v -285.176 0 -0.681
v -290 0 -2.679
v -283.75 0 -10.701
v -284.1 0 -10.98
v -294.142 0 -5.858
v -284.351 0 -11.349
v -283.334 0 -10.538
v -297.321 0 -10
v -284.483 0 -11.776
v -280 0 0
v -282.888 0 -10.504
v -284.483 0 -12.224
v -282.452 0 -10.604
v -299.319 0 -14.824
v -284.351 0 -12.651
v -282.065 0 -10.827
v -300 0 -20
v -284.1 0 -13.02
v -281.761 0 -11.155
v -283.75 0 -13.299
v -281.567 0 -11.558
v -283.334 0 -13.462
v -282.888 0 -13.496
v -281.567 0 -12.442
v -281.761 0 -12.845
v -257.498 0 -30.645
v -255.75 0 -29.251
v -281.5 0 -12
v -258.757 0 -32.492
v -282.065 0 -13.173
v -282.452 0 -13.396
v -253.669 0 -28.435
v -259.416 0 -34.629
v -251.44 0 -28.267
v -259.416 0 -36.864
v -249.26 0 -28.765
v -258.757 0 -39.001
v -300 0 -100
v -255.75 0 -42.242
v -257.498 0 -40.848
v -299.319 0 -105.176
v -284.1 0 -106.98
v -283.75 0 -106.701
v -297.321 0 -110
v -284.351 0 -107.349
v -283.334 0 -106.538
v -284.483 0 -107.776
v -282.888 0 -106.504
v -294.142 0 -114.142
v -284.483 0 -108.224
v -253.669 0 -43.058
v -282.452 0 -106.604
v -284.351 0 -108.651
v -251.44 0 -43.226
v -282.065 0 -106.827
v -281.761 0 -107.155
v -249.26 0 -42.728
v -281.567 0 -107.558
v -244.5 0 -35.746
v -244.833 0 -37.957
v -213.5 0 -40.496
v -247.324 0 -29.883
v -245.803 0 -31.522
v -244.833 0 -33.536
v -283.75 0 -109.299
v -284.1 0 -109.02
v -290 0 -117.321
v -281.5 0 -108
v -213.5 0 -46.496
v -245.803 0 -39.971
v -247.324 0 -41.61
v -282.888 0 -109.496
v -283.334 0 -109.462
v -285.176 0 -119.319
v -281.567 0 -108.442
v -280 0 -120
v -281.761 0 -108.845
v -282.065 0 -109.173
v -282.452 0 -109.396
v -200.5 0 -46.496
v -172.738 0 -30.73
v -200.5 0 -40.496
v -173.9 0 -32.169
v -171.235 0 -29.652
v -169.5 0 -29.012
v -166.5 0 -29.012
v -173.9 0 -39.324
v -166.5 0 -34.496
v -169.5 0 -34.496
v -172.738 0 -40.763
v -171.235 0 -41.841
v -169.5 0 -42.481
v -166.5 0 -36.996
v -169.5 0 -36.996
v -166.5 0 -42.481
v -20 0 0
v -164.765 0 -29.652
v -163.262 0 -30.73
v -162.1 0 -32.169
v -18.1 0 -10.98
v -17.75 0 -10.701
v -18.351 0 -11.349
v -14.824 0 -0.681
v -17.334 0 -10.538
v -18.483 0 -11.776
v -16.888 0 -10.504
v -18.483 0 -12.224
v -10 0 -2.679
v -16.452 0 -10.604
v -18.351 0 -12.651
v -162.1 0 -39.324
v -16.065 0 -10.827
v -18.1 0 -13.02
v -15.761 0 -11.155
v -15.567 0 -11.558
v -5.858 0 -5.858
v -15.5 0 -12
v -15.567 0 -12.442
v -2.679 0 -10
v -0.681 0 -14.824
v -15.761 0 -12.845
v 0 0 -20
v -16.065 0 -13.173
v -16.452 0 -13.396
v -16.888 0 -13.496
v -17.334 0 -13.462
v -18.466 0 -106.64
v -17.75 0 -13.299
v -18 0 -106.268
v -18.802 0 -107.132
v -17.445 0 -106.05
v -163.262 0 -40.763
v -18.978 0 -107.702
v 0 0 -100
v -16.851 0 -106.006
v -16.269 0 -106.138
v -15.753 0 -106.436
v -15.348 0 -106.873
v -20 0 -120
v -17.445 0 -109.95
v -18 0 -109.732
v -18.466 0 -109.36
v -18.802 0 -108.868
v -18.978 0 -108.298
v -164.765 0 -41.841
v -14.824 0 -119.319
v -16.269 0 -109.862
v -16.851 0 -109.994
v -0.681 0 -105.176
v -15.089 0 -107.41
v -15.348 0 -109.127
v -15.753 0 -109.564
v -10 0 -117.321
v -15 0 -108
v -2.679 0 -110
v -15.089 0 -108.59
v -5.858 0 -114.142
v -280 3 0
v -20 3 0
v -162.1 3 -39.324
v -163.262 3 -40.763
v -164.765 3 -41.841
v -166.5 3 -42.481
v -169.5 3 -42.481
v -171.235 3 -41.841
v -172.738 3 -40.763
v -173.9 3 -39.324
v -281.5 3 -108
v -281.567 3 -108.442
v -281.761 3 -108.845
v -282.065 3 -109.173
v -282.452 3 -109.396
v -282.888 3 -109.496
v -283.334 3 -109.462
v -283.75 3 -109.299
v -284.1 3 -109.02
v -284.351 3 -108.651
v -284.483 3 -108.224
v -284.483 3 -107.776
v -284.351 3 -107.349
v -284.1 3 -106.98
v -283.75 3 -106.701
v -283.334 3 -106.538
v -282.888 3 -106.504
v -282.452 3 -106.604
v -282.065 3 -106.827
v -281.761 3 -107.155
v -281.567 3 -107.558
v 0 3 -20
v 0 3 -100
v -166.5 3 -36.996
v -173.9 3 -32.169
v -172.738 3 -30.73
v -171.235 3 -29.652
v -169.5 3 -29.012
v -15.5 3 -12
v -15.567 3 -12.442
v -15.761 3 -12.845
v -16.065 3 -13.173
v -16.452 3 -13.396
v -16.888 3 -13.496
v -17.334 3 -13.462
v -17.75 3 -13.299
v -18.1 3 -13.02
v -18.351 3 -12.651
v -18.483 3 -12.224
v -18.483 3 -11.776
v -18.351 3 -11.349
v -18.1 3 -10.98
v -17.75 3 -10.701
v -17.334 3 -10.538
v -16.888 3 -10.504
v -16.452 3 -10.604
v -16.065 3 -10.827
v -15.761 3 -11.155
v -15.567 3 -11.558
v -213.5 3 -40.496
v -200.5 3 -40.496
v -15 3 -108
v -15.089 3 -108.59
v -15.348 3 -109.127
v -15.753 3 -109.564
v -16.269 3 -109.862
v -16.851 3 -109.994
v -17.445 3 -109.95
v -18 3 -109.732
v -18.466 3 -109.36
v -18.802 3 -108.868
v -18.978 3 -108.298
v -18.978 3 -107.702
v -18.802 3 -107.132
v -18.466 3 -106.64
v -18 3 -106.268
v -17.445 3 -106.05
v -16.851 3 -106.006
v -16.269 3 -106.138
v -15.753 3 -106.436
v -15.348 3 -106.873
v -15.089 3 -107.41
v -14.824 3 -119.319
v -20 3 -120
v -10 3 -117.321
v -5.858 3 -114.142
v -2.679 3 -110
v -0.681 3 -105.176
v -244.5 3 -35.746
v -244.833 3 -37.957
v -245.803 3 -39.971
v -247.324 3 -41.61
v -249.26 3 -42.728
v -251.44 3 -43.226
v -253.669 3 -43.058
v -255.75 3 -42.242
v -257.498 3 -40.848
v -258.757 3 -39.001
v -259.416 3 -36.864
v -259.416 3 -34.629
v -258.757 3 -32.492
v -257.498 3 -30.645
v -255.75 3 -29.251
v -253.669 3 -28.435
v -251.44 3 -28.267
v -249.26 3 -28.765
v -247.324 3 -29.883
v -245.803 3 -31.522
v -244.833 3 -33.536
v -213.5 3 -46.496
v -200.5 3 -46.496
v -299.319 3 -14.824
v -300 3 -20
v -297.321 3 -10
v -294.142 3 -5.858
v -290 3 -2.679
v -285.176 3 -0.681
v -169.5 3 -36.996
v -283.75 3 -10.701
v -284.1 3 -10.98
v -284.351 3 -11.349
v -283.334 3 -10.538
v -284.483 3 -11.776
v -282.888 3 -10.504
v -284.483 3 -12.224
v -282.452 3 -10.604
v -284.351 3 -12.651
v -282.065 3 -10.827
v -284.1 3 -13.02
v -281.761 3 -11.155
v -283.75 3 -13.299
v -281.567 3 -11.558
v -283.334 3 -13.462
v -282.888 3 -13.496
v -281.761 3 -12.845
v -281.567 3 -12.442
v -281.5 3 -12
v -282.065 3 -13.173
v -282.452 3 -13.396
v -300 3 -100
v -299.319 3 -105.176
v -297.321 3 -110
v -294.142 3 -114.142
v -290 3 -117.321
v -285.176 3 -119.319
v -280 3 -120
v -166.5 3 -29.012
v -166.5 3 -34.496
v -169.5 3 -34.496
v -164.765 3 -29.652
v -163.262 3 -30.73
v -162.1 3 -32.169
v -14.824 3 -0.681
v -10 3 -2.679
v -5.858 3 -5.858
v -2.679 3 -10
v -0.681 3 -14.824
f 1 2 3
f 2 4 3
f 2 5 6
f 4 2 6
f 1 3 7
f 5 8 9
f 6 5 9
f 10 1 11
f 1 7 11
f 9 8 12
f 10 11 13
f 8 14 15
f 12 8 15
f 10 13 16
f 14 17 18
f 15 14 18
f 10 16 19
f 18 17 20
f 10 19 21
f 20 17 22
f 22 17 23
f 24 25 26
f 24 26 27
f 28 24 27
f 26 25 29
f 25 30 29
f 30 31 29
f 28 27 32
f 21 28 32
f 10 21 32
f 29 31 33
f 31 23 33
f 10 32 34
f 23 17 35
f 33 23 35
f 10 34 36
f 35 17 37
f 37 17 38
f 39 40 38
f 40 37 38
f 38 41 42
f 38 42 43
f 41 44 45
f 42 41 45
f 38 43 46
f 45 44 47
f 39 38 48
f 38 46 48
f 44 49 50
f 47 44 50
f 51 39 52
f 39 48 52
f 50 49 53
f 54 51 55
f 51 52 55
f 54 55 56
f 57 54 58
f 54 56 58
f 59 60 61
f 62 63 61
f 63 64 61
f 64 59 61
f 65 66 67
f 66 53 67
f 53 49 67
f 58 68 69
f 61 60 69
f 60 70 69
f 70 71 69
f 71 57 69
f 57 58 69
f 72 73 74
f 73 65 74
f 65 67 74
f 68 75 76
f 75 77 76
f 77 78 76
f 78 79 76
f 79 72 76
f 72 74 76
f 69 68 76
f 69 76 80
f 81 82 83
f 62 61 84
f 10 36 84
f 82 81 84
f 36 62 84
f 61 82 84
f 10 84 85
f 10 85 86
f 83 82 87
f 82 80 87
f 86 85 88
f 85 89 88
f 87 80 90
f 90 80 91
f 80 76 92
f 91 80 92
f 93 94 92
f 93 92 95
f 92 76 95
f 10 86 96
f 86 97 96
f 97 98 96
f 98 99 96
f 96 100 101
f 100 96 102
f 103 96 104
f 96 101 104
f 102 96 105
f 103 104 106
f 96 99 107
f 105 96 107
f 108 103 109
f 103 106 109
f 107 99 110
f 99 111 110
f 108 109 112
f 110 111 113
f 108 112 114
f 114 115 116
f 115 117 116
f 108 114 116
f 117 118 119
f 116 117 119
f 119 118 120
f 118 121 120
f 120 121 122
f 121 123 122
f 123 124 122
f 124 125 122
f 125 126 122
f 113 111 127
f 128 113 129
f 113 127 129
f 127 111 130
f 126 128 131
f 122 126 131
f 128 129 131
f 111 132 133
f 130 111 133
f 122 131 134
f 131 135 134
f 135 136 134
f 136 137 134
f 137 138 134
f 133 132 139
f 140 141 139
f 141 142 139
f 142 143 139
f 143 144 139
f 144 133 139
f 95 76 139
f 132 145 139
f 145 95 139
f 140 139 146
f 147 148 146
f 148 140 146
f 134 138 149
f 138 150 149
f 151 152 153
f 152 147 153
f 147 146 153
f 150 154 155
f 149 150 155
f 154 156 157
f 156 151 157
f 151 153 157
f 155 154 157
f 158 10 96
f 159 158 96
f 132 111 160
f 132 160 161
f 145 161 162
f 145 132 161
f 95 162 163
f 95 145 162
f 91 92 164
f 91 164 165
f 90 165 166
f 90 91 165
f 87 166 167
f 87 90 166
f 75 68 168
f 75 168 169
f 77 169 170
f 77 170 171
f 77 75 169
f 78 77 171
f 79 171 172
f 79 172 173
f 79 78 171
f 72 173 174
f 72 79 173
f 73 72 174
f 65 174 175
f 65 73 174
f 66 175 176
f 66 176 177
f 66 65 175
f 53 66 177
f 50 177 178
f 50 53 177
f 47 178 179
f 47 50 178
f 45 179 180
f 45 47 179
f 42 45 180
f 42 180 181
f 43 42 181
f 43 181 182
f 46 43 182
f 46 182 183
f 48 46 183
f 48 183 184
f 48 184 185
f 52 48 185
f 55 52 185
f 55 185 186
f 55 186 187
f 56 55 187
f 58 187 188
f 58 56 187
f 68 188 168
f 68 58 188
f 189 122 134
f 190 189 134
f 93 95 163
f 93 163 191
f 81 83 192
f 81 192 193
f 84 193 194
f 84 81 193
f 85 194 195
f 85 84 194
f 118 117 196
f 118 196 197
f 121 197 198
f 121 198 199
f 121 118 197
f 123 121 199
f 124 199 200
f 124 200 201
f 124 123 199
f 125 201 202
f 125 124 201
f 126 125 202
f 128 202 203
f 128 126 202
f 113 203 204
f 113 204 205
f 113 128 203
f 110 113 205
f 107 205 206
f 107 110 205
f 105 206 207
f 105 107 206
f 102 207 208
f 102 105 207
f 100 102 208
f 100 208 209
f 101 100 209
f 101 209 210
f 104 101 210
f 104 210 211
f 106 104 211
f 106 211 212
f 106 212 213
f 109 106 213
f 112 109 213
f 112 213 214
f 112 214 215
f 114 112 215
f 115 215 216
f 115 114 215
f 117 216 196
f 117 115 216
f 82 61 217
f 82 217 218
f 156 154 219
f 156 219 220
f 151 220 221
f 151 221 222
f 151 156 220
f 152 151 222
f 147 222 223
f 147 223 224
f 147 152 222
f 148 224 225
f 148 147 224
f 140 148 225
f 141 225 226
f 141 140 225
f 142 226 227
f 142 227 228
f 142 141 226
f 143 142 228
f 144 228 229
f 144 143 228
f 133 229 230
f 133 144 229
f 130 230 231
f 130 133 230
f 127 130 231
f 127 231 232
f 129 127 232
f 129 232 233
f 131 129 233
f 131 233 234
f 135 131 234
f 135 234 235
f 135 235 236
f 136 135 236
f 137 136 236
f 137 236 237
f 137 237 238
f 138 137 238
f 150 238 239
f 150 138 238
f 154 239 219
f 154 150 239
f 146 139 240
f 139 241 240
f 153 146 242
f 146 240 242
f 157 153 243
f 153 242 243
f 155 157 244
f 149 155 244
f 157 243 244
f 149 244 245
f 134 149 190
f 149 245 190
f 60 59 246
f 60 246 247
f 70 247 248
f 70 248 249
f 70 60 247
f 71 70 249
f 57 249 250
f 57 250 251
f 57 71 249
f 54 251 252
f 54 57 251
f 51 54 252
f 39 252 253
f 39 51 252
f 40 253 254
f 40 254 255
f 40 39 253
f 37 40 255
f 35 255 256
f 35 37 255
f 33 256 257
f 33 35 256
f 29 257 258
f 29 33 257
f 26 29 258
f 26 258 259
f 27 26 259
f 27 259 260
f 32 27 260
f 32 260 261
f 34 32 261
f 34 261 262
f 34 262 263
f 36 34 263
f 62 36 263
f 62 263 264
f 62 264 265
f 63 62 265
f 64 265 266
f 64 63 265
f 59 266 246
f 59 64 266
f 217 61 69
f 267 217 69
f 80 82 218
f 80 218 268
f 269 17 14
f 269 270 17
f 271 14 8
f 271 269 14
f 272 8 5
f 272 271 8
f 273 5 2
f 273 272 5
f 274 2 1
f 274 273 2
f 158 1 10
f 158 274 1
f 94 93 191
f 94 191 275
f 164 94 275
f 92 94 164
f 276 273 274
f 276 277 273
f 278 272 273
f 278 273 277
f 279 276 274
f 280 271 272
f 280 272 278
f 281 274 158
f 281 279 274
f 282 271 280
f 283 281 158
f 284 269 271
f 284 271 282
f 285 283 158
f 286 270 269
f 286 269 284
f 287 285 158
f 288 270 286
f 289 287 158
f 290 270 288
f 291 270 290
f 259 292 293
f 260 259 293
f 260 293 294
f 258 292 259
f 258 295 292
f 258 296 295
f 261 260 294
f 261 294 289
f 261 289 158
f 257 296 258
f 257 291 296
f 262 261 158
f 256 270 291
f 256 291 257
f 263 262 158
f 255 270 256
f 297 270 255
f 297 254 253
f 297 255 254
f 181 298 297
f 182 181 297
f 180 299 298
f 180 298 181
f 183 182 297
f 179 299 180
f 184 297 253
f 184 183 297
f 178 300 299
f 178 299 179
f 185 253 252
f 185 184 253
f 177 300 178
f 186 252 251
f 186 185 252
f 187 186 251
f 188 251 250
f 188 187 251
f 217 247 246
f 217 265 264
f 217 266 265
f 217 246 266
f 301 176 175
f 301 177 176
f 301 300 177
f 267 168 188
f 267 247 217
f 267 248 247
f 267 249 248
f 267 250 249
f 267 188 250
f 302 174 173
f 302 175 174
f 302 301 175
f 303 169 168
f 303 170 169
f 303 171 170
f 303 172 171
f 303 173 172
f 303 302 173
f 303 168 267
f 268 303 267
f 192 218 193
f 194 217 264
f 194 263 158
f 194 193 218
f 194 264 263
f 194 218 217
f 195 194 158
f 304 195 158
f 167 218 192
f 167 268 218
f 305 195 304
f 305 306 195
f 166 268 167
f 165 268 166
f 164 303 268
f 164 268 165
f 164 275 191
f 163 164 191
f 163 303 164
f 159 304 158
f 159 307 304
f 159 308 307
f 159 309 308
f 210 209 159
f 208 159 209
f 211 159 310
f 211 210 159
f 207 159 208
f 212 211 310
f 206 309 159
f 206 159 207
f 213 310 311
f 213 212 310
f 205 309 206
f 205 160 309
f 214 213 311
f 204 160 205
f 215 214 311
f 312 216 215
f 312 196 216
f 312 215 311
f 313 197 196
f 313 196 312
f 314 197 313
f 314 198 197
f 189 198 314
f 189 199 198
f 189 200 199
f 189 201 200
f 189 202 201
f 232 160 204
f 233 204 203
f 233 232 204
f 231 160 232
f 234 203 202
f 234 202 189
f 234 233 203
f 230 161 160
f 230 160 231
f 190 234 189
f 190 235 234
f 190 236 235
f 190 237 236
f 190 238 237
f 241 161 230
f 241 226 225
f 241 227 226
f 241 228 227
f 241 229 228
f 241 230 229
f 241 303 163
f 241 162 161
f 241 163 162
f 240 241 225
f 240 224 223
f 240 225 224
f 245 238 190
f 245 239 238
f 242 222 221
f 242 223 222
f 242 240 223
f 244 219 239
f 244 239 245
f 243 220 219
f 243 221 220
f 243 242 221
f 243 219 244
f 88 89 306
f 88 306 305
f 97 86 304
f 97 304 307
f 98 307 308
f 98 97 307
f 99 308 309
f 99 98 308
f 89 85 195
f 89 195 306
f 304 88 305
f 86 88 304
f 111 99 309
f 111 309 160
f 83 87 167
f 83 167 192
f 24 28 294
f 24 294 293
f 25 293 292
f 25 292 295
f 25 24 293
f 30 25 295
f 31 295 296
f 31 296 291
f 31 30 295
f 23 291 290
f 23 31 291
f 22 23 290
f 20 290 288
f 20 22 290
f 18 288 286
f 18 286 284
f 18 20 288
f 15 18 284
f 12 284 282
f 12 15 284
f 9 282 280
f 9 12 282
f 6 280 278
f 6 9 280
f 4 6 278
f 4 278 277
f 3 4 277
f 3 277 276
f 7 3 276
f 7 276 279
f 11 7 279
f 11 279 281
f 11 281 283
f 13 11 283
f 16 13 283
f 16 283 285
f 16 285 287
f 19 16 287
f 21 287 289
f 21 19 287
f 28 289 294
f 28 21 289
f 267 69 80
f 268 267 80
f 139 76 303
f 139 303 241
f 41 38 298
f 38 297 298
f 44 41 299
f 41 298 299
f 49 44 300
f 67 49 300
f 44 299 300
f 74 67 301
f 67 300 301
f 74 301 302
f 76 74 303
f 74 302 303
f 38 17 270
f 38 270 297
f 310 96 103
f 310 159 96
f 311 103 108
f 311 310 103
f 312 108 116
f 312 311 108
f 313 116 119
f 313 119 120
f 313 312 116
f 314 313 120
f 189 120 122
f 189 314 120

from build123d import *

# Parameters (mm, degrees)
SKETCH_2_W      = 300
SKETCH_2_H      = 120
SKETCH_2_R      = 1.5
SKETCH_2_R_2    = 2
SKETCH_2_R_3    = 7.5
SKETCH_2_W_2    = 13
SKETCH_2_H_2    = 6
EXTRUDE_1_DEPTH = 3
FILLET_1_R      = 20


with BuildPart() as part:
    # Эскиз2 → Бобышка-Вытянуть1 (new body)
    with BuildSketch(Plane(origin=(0, 0, 0), x_dir=(1, 0, 0), z_dir=(0, 1, 0))):
        with Locations((-150, 60)):
            Rectangle(SKETCH_2_W, SKETCH_2_H)
        with Locations((-283, 108)):
            Circle(SKETCH_2_R, mode=Mode.SUBTRACT)
        with Locations((-17, 108)):
            Circle(SKETCH_2_R_2, mode=Mode.SUBTRACT)
        with Locations((-17, 12)):
            Circle(SKETCH_2_R, mode=Mode.SUBTRACT)
        with Locations((-283, 12)):
            Circle(SKETCH_2_R, mode=Mode.SUBTRACT)
        with Locations((-252, 35.746485704)):
            Circle(SKETCH_2_R_3, mode=Mode.SUBTRACT)
        with Locations((-207, 43.496485704)):
            Rectangle(SKETCH_2_W_2, SKETCH_2_H_2, mode=Mode.SUBTRACT)
        with BuildLine():
            Line((-173.9, 39.324194468), (-173.9, 32.16877694))
            ThreePointArc((-173.9, 32.16877694), (-172.022697555, 30.140426091), (-169.5, 29.011502408))
            Line((-169.5, 29.011502408), (-169.5, 34.496485704))
            Line((-169.5, 34.496485704), (-166.5, 34.496485704))
            Line((-166.5, 34.496485704), (-166.5, 29.011502408))
            ThreePointArc((-166.5, 29.011502408), (-163.977302445, 30.140426091), (-162.1, 32.16877694))
            Line((-162.1, 32.16877694), (-162.1, 39.324194468))
            ThreePointArc((-162.1, 39.324194468), (-163.977302445, 41.352545317), (-166.5, 42.481469))
            Line((-166.5, 42.481469), (-166.5, 36.996485704))
            Line((-166.5, 36.996485704), (-169.5, 36.996485704))
            Line((-169.5, 36.996485704), (-169.5, 42.481469))
            ThreePointArc((-169.5, 42.481469), (-172.022697555, 41.352545317), (-173.9, 39.324194468))
        make_face(mode=Mode.SUBTRACT)
    extrude(amount=EXTRUDE_1_DEPTH)

    # Скругление1
    fillet_1_edges = [part.edges().sort_by_distance(p)[0] for p in [
        (0, 1.5, 0),
        (-300, 1.5, 0),
        (-300, 1.5, -120),
        (0, 1.5, -120),
    ]]
    fillet(fillet_1_edges, radius=FILLET_1_R)


solid = part.part
